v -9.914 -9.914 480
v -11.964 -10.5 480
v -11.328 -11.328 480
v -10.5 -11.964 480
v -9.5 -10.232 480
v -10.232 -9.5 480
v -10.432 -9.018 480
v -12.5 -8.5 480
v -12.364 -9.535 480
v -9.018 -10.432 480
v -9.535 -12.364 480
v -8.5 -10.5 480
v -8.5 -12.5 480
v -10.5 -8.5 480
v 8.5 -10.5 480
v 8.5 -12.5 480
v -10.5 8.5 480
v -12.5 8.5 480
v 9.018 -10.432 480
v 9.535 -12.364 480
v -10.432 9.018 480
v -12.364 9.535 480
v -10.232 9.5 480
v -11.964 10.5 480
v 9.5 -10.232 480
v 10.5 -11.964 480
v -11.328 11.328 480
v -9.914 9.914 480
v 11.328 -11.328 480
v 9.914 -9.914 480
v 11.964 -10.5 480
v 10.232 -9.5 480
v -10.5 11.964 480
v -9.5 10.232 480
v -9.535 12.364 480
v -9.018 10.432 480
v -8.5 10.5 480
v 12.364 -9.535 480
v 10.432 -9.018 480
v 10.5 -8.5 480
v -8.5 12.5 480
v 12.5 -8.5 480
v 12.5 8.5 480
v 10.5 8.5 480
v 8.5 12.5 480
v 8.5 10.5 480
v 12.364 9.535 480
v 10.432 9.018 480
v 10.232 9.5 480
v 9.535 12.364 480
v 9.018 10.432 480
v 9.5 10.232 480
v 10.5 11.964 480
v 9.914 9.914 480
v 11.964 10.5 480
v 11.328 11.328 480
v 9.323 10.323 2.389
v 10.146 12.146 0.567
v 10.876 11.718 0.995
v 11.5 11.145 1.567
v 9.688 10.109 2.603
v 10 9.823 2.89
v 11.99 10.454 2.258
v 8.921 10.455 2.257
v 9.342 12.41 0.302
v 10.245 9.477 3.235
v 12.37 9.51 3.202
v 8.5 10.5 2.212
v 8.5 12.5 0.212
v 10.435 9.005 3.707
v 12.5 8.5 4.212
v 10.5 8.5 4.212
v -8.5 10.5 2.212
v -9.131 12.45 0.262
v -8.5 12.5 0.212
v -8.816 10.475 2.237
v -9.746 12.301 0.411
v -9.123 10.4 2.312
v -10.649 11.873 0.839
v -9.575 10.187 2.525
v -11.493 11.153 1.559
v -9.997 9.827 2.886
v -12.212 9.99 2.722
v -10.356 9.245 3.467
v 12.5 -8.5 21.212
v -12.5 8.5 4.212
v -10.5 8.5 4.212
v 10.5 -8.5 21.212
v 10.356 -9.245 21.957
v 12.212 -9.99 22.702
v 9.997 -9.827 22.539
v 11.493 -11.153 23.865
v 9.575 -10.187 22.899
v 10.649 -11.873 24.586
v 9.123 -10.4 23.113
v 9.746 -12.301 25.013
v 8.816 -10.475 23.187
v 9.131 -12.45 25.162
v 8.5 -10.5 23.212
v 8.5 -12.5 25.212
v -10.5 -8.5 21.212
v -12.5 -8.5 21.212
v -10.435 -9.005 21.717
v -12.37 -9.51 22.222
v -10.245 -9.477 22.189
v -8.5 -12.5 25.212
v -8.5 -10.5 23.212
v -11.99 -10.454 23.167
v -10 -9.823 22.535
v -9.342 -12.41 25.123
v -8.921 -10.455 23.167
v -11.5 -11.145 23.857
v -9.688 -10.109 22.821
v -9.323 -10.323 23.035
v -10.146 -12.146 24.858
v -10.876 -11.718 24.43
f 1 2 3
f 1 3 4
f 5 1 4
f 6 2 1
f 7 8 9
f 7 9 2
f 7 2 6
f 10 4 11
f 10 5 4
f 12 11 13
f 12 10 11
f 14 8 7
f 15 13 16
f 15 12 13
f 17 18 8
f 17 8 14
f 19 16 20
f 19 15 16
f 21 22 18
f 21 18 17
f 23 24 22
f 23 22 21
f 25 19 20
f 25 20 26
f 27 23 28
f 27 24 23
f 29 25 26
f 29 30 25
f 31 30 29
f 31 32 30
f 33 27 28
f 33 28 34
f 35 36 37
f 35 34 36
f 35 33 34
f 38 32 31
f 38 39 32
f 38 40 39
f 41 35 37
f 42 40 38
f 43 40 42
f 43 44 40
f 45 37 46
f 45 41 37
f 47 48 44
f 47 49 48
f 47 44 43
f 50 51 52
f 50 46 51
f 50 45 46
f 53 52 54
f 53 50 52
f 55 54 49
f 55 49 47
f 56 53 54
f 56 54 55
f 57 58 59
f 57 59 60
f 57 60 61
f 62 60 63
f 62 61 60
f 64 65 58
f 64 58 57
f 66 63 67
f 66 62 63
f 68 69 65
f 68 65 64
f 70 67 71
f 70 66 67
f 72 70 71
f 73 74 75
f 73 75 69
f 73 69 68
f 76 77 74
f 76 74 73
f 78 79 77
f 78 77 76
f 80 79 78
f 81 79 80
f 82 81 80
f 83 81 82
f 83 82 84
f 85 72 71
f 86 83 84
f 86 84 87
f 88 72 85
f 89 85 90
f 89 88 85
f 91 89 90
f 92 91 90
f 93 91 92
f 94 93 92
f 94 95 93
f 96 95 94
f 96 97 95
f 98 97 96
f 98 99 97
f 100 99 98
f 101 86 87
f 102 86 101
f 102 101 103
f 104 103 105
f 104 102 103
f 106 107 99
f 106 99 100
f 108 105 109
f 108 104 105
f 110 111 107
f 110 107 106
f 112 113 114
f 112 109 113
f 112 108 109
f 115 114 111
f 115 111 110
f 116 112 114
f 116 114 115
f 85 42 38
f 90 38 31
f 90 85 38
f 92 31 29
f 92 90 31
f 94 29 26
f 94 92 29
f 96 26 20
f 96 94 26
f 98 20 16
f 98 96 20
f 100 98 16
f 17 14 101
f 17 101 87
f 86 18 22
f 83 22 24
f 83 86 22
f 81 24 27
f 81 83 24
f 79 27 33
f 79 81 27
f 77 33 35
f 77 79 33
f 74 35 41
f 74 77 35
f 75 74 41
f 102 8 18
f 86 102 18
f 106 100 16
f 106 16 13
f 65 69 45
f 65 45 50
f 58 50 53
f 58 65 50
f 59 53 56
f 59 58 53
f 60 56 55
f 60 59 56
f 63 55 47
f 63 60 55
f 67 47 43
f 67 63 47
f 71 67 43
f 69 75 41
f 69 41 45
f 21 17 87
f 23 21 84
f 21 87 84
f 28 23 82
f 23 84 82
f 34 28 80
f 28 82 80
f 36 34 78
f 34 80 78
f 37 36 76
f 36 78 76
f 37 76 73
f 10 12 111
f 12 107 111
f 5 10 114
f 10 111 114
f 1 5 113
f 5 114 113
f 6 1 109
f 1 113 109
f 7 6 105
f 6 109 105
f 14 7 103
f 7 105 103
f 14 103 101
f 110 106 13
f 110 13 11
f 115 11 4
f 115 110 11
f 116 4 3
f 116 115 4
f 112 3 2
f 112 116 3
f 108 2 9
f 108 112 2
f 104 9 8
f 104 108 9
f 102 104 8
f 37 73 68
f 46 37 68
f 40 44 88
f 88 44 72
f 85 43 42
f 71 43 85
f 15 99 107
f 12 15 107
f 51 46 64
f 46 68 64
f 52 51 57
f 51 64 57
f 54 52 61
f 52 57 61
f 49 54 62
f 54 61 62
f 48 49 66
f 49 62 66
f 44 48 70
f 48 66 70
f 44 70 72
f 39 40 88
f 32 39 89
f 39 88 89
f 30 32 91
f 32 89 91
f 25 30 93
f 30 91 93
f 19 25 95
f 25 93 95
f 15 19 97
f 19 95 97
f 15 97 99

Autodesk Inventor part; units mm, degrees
ref_plane "Start plane" through (0, 0, 0.2121) normal (0, 0, 1) x (1, 0, 0)
ref_plane "End plane" through (0, 0, 480) normal (0, 0, 1) x (1, 0, 0)
sketch "Sketch" plane through (0, 0, 0) normal (0, 0, 1) x (1, 0, 0)
  line L0 (-12.5, -8.5) -> (-12.5, 8.5)
  line L1 (-8.5, 12.5) -> (8.5, 12.5)
  line L2 (12.5, 8.5) -> (12.5, -8.5)
  line L3 (8.5, -12.5) -> (-8.5, -12.5)
  arc A0 (-12.5, -8.5) -> (-8.5, -12.5) centre (-8.5, -8.5) ccw
  arc A1 (12.5, 8.5) -> (8.5, 12.5) centre (8.5, 8.5) ccw
  arc A2 (-8.5, 12.5) -> (-12.5, 8.5) centre (-8.5, 8.5) ccw
  arc A3 (8.5, -12.5) -> (12.5, -8.5) centre (8.5, -8.5) ccw
  arc A4 (-8.5, 10.5) -> (-10.5, 8.5) centre (-8.5, 8.5) ccw
  line L4 (-8.5, 10.5) -> (8.5, 10.5)
  arc A5 (10.5, 8.5) -> (8.5, 10.5) centre (8.5, 8.5) ccw
  line L5 (10.5, 8.5) -> (10.5, -8.5)
  arc A6 (8.5, -10.5) -> (10.5, -8.5) centre (8.5, -8.5) ccw
  line L6 (8.5, -10.5) -> (-8.5, -10.5)
  arc A7 (-10.5, -8.5) -> (-8.5, -10.5) centre (-8.5, -8.5) ccw
  line L7 (-10.5, -8.5) -> (-10.5, 8.5)
  line L8 (0, 18.6598) -> (0, -18.6598) construction
  line L9 (-18.6598, 0) -> (18.6598, 0) construction
  dimension "d7" = 4
  dimension "d9" = 25
  dimension "d11" = 25
  dimension "d12" = 2
  dimension "d15" = 12.5
  dimension "d16" = 12.5
extrude "Body" add sketch "Sketch" along normal up to surface (479.7879 mm away) from surface at 0.2121
sketch "Sketch3" plane through (0, 0, 0) normal (0, 0, 1) x (1, 0, 0)
  line L0 (0, 0) -> (10, 0)
ref_plane "Work Plane3" through (0, 0, 0) normal (0, -1, 0) x (1, 0, 0)
sketch "Sketch4" plane through (0, 0, 0) normal (0, -1, 0) x (1, 0, 0)
  line L0 (-2, 0.2121) -> (12, 0.2121)
  line L1 (-2, 480) -> (12, 480)
  dimension "d18" = 479.7879
ref_plane "Work Plane4" through (0, 12.6061, 0.1061) normal (0, -0.7071, -0.7071) x (1, 0, 0)
split "Split1" plane through (0, 12.6061, 0.1061) removes the side toward (0, -0.7071, -0.7071)
equation "\"d7\" = G_IR"
equation "\"d9\" = G_W"
equation "\"d11\" = G_H"
equation "\"d12\" = G_T"
equation "\"d15\" = 0.5 * d9"
equation "\"d16\" = 0.5 * d11"
equation "\"d3\" = G_L"
equation "\"G_W\" = 25"
equation "\"G_H\" = 25"
equation "\"G_T\" = 2"
equation "\"G_IR\" = 4"
equation "\"G_L\" = d18"
equation "\"G_OFFSET_START\" = -0.21213"
equation "\"G_OFFSET_END\" = 0"
equation "\"d13\" = -G_OFFSET_START"
properties part number "ISO 4019 - 25x25x2 - 479.788" material "Steel, Mild"
